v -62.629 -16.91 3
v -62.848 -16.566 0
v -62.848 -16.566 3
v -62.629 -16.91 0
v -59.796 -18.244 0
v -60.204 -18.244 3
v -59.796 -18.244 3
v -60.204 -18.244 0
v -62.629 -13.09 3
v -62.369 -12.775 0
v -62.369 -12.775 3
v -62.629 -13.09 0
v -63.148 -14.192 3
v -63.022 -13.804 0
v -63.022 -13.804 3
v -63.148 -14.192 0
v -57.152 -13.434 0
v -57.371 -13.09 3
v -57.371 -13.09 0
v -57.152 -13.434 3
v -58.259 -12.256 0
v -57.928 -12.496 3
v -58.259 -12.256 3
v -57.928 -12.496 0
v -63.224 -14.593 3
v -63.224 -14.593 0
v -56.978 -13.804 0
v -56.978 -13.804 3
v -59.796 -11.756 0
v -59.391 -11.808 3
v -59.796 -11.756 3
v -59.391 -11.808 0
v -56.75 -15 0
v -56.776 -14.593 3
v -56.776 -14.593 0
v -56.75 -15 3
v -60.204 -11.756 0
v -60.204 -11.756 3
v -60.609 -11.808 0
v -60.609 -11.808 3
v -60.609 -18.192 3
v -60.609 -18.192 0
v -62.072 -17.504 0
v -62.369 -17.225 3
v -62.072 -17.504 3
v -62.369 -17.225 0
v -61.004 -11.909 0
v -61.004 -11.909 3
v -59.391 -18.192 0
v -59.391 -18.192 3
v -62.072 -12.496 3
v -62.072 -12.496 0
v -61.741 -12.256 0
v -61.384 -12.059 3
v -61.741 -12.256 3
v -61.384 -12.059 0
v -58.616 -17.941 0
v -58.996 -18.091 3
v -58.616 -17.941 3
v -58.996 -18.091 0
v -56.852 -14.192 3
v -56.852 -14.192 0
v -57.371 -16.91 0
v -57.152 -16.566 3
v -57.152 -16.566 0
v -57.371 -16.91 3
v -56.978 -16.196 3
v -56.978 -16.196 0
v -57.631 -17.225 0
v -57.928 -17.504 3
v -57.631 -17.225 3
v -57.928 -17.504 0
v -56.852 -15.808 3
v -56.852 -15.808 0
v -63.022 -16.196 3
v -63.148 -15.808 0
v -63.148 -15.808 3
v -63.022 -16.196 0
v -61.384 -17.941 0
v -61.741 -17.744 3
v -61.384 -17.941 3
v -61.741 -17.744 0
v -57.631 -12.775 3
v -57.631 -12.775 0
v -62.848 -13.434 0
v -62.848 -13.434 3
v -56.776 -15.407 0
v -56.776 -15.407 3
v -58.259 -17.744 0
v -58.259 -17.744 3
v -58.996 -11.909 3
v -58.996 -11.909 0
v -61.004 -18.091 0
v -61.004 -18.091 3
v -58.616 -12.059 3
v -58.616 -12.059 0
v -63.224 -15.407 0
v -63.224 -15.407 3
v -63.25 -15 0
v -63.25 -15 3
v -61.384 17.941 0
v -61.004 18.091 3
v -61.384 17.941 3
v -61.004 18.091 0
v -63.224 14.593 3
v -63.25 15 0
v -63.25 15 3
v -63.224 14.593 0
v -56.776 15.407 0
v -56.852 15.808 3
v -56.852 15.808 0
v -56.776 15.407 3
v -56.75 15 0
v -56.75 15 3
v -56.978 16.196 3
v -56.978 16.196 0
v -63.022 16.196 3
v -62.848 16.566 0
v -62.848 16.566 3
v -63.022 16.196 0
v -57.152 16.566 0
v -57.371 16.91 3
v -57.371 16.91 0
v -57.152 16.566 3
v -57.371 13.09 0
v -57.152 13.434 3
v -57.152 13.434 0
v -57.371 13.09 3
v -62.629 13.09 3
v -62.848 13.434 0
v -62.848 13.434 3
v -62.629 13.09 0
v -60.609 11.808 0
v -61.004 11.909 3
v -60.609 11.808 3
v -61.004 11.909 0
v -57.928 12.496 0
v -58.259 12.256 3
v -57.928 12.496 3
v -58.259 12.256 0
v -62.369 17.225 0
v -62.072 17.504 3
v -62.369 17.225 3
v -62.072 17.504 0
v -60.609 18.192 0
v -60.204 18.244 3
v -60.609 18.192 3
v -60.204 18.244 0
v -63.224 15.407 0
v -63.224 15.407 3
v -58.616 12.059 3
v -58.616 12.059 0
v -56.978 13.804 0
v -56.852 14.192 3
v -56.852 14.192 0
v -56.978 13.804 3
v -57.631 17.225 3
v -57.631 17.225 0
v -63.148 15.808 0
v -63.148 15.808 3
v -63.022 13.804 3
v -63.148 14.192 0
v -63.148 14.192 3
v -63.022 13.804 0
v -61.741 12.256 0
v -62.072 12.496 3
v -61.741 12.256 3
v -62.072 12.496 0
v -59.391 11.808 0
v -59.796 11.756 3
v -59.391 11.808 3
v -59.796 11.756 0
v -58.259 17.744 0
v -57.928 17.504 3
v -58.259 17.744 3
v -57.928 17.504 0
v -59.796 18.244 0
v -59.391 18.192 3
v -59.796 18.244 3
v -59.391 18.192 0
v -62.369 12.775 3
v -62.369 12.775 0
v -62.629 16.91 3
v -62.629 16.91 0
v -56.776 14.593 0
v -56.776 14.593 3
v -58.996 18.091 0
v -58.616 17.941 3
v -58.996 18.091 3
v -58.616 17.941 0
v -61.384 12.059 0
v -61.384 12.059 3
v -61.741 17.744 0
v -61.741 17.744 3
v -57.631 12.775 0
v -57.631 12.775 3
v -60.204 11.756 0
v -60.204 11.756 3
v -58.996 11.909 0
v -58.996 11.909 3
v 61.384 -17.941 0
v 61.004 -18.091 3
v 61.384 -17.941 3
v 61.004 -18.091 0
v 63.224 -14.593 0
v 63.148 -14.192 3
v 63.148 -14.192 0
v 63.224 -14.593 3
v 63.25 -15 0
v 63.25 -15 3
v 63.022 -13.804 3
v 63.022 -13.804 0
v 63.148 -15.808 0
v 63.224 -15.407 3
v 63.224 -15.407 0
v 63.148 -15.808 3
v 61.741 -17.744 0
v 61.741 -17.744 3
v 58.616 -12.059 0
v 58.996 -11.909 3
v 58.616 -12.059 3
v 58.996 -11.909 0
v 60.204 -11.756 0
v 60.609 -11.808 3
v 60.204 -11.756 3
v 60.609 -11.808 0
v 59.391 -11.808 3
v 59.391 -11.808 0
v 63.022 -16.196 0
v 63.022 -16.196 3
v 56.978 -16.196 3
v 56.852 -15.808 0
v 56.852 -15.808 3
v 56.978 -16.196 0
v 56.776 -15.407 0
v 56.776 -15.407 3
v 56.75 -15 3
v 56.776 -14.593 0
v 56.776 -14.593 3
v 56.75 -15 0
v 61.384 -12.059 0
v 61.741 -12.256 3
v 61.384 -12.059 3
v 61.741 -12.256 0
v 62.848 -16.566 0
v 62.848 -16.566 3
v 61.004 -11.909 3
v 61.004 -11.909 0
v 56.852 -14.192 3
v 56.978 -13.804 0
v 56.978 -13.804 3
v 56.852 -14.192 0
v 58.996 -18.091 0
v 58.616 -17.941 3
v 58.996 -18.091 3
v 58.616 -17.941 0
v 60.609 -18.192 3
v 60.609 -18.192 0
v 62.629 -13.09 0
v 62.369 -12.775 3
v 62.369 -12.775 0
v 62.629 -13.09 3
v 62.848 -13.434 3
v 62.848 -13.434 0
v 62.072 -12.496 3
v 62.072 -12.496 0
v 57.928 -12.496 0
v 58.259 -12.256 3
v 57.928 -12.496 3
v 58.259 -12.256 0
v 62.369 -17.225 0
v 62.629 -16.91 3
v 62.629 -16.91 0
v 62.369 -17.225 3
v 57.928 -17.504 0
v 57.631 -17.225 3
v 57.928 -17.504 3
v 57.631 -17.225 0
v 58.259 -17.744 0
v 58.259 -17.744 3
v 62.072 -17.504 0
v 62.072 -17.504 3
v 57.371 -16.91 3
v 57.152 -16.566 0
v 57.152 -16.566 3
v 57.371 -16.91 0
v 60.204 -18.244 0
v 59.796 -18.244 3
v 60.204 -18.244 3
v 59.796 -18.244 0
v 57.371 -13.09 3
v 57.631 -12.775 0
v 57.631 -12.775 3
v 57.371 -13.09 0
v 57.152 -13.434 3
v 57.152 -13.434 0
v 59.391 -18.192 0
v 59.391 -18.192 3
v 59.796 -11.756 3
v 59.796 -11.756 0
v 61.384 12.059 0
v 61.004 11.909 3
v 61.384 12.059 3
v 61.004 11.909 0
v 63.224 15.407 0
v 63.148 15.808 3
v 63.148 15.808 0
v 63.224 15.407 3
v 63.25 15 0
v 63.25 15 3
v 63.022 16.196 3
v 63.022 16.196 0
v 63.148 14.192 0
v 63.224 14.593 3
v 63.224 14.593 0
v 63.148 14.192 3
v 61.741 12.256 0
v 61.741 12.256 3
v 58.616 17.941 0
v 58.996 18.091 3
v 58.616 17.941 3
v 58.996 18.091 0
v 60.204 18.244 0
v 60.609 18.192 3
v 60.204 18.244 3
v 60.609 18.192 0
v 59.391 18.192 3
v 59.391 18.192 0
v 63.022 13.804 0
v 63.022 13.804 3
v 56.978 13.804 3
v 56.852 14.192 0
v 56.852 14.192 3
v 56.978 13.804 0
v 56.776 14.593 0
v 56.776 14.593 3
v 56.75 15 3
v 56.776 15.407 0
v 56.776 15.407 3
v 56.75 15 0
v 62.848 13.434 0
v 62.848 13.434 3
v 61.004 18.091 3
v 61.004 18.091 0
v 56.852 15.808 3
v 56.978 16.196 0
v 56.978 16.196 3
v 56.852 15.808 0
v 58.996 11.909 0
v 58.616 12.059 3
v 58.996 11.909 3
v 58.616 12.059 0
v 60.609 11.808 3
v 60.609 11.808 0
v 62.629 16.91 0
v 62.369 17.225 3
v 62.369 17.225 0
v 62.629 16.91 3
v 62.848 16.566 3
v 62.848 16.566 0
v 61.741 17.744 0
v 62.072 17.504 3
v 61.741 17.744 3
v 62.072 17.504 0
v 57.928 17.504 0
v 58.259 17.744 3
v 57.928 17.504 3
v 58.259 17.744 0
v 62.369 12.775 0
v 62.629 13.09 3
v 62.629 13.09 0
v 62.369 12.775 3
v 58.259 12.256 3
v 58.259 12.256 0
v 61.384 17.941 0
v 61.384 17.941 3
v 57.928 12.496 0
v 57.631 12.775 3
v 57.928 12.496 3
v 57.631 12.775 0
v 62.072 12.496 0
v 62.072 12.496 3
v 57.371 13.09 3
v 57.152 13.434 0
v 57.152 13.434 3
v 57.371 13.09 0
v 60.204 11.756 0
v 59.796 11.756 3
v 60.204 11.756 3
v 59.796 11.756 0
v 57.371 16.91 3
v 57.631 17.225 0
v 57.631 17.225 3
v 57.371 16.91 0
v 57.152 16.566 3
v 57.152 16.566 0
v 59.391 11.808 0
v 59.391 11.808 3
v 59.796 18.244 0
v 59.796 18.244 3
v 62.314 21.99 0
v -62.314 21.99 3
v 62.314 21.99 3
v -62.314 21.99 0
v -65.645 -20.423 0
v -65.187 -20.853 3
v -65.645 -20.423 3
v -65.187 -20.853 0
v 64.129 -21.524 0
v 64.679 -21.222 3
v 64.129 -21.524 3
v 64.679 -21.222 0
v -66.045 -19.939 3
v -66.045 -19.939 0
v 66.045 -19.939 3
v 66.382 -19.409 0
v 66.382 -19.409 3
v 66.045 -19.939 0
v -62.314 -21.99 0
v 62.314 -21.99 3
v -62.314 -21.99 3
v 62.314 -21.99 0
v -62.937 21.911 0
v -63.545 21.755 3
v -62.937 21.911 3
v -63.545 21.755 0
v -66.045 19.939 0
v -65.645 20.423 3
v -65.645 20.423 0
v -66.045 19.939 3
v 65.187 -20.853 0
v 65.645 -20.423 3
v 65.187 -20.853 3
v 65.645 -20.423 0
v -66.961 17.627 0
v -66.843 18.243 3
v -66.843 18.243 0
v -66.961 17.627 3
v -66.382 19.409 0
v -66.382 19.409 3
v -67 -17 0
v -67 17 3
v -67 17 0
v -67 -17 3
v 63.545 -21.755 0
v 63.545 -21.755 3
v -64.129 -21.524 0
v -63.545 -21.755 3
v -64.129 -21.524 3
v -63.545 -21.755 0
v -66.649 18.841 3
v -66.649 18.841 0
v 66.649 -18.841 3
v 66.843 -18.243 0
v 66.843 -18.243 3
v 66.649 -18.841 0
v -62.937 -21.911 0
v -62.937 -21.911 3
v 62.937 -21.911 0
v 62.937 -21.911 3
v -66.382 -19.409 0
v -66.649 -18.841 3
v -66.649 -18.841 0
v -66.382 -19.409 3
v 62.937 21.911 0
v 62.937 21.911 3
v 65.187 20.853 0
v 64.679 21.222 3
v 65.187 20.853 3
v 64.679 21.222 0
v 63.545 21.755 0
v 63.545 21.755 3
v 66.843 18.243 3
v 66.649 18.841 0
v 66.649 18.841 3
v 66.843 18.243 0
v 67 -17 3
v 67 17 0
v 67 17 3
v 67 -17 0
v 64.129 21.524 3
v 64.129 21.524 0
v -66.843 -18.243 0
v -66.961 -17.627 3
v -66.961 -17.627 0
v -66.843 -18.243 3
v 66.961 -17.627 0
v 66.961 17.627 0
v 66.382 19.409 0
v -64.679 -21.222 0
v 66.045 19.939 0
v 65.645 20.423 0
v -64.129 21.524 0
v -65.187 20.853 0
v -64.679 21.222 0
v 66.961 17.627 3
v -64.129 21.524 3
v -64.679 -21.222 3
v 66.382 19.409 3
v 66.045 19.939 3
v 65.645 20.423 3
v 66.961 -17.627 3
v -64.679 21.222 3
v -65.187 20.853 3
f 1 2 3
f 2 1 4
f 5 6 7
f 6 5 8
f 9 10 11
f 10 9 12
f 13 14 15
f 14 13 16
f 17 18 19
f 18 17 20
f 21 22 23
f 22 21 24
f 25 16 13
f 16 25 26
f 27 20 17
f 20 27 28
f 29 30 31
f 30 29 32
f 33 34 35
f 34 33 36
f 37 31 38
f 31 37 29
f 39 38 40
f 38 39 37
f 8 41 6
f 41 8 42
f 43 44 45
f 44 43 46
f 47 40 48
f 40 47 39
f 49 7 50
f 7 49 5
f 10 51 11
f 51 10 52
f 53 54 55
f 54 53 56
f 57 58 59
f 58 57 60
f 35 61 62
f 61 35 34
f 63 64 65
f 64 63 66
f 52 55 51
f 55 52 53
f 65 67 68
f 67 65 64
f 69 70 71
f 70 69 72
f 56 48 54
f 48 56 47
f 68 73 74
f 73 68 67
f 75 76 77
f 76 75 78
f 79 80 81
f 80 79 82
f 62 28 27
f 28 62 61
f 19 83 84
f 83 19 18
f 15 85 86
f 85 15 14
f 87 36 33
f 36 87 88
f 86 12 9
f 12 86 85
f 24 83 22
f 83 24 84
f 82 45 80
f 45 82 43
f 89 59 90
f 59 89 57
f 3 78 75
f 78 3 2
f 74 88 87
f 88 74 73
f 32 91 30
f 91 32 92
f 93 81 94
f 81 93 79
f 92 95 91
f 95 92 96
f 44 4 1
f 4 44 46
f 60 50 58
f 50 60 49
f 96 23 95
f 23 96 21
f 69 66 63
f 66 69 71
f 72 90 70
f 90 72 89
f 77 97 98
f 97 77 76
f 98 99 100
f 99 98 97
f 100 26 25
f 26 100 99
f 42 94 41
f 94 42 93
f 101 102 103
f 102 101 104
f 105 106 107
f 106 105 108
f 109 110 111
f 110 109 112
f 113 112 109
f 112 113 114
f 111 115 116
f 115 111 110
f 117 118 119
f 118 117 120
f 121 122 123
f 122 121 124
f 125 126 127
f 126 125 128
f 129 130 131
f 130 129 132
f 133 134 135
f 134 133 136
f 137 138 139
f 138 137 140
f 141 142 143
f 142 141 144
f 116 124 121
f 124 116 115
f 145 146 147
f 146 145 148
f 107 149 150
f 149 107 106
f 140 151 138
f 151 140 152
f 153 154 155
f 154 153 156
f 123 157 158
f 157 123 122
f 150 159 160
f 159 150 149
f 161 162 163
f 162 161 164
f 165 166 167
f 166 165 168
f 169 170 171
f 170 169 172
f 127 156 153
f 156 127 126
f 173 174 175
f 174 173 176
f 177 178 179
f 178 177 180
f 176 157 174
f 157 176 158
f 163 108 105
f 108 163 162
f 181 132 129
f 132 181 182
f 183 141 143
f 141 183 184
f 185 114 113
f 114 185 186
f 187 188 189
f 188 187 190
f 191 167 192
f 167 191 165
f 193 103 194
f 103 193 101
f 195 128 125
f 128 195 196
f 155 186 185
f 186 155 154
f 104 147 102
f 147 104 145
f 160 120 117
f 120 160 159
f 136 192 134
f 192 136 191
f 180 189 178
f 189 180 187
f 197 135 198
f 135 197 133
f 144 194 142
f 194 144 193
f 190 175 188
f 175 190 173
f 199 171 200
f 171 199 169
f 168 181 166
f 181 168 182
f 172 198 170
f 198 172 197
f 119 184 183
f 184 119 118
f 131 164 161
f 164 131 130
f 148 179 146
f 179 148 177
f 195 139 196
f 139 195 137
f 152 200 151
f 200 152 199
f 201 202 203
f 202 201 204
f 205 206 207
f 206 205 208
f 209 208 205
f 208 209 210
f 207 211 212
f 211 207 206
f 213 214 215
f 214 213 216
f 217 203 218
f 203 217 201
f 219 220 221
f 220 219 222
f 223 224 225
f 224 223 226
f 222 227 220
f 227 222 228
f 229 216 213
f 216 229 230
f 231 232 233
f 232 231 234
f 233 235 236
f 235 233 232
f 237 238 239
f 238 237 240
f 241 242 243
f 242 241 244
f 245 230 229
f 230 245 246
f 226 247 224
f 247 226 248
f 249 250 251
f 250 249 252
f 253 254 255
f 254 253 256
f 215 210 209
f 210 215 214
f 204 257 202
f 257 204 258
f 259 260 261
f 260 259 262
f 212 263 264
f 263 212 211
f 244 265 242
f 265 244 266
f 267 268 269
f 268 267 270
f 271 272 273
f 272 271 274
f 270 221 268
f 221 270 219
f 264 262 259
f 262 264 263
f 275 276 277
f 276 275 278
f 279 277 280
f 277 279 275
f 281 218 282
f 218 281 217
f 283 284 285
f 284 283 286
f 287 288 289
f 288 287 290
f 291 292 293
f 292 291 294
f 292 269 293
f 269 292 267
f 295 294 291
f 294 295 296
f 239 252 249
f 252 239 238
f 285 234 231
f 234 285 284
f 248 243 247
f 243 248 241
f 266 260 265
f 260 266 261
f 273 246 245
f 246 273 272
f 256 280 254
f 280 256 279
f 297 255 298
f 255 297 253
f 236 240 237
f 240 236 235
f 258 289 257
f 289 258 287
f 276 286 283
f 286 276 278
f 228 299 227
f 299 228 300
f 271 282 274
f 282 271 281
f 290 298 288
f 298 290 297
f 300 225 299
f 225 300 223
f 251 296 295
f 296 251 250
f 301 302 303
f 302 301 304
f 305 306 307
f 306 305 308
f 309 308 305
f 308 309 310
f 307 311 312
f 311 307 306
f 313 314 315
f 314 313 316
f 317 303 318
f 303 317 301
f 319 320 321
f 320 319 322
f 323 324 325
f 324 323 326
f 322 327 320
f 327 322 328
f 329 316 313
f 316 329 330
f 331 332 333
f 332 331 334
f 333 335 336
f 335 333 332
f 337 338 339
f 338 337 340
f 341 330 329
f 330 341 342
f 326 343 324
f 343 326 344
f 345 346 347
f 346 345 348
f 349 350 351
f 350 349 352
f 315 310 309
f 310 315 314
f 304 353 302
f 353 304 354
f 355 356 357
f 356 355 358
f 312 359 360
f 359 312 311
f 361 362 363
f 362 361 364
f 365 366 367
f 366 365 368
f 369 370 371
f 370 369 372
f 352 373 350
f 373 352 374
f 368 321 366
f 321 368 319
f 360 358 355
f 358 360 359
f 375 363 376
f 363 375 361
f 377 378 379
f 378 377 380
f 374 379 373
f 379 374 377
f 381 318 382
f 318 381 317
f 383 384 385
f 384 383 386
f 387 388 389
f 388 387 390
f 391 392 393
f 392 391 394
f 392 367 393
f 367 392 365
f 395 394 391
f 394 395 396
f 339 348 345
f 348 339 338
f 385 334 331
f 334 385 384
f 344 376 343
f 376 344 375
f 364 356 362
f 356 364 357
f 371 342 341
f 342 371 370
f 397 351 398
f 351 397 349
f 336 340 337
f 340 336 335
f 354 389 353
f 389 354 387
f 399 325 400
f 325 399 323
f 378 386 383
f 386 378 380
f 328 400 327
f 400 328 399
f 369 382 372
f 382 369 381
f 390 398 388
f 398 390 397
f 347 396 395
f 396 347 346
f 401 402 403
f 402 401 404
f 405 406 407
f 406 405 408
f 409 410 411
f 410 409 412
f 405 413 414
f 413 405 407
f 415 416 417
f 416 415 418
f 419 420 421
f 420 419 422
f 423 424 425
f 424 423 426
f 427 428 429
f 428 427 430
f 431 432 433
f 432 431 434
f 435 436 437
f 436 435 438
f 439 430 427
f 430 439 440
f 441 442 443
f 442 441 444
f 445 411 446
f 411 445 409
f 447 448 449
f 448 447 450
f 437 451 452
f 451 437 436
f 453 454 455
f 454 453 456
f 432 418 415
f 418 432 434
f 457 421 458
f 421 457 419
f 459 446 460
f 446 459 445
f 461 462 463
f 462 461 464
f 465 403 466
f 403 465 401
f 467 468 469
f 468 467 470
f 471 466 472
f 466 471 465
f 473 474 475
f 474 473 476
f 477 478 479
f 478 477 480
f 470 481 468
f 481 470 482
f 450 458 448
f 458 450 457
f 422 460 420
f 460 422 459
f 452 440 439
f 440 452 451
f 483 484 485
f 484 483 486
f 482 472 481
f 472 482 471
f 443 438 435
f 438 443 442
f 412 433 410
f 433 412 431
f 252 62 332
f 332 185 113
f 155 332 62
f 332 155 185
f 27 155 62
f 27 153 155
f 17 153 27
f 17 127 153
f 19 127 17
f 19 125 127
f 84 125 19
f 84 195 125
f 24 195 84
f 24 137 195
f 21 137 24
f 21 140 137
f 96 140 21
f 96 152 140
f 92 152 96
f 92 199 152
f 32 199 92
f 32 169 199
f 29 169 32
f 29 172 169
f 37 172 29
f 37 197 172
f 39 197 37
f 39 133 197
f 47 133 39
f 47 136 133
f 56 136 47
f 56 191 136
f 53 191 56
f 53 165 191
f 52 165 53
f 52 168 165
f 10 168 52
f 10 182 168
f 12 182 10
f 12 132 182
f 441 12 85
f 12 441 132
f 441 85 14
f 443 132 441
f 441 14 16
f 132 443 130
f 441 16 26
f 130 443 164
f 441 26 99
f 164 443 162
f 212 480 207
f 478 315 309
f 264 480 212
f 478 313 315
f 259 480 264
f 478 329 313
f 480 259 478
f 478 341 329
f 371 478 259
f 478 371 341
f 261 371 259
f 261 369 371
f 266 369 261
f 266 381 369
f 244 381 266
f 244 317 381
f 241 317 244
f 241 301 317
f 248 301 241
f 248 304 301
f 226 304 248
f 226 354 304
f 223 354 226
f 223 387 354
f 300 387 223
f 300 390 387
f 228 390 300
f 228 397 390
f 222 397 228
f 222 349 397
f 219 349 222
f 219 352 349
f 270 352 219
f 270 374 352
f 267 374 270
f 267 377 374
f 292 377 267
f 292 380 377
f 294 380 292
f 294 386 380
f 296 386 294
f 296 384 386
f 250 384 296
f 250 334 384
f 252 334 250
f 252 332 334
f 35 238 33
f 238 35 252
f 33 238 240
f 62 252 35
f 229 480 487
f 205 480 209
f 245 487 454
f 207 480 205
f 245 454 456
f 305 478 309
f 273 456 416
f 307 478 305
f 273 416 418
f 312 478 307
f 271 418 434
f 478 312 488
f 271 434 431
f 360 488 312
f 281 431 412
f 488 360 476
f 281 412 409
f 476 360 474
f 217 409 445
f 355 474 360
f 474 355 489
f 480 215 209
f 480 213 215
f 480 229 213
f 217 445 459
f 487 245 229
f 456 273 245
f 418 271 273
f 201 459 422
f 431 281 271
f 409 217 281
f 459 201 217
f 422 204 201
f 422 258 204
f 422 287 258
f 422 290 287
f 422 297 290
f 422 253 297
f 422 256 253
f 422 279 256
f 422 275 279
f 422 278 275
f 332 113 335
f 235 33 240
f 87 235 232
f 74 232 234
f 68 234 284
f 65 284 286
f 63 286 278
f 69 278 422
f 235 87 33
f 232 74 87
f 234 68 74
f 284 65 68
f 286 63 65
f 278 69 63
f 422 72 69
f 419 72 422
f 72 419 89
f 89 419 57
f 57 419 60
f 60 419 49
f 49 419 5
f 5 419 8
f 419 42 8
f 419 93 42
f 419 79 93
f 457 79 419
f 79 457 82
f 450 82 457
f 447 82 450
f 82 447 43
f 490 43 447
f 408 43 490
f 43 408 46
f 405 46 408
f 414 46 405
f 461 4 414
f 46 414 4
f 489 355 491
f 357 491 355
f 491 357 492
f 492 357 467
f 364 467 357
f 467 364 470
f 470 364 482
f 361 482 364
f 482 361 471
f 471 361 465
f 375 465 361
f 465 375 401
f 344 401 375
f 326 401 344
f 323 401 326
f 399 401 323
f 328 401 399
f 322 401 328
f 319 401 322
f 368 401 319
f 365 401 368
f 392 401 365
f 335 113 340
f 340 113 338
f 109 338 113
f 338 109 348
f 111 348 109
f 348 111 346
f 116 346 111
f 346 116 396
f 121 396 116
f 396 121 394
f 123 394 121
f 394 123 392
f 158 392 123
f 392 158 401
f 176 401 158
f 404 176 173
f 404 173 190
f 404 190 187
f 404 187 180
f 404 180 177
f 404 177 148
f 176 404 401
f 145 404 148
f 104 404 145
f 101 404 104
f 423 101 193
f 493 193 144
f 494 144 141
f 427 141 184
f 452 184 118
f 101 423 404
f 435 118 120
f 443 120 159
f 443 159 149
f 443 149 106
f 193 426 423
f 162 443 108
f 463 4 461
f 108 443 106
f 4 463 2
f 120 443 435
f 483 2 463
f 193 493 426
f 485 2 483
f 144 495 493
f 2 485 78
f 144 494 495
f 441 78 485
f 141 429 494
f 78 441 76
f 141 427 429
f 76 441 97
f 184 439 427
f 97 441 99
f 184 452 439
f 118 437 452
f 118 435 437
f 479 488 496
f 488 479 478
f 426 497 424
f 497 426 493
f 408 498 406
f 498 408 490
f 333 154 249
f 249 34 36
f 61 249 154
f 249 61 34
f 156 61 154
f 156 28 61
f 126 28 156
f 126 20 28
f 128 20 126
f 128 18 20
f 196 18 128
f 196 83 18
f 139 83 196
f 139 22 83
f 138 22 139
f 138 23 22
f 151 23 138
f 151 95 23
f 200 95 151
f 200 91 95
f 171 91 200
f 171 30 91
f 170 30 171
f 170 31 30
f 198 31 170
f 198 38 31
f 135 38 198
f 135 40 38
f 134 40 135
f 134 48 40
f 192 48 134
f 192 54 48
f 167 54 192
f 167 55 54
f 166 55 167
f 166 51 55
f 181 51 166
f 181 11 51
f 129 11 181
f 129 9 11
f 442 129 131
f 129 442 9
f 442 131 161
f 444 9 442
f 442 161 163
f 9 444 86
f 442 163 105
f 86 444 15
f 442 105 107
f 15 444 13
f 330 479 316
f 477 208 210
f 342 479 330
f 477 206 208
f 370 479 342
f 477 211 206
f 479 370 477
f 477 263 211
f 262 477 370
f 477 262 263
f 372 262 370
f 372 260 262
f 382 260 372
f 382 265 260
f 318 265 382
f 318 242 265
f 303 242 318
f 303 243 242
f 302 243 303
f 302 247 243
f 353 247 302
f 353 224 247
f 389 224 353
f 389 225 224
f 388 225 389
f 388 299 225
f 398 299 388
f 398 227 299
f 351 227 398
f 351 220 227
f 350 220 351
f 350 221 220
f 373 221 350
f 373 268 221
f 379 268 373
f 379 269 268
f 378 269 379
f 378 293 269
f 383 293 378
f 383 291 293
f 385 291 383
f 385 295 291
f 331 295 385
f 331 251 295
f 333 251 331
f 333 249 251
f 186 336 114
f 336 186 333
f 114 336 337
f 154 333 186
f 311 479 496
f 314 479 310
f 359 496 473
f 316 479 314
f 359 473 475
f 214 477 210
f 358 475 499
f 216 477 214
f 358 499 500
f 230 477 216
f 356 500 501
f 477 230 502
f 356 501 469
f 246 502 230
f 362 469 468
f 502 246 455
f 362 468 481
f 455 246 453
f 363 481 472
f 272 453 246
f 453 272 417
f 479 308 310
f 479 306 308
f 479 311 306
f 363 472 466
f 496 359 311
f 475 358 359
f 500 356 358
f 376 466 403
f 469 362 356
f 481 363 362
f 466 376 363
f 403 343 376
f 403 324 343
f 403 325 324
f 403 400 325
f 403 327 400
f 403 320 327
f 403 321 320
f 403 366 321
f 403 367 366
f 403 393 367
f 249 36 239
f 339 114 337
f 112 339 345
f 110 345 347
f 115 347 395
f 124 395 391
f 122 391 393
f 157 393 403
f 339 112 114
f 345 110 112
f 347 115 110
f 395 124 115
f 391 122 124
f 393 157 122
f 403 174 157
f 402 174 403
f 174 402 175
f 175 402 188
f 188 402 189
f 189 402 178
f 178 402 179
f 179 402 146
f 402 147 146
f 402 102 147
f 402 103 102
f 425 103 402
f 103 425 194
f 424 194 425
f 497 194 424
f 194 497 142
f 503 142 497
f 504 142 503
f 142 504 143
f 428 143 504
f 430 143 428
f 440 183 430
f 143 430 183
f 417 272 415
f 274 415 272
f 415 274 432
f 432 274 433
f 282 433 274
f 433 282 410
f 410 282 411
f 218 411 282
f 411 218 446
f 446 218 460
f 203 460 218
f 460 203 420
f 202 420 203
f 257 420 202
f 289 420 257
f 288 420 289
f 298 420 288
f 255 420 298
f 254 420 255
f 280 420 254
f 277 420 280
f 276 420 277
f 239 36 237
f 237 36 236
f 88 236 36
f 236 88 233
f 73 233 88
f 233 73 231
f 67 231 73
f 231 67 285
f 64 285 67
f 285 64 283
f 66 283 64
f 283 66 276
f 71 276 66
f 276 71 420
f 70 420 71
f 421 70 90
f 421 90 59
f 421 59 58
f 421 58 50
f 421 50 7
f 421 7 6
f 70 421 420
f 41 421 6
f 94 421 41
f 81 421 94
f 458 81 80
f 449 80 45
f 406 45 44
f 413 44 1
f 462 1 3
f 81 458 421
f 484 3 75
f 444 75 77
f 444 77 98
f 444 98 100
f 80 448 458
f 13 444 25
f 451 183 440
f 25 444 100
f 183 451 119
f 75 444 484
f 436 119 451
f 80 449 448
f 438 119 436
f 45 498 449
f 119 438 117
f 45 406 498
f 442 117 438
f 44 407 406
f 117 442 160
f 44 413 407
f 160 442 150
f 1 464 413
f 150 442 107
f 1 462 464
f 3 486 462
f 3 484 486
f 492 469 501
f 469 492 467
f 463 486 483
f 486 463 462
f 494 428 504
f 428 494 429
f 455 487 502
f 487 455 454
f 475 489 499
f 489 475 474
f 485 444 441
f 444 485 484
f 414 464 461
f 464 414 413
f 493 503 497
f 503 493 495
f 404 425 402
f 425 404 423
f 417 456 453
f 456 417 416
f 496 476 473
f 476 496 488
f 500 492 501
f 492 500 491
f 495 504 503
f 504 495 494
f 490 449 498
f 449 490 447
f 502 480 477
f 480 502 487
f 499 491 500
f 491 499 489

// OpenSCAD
$fn = 50;


difference() {
	union() {
		hull() {
			translate(v = [-62.0000000000, 17.0000000000, 0]) {
				cylinder(h = 3, r = 5);
			}
			translate(v = [62.0000000000, 17.0000000000, 0]) {
				cylinder(h = 3, r = 5);
			}
			translate(v = [-62.0000000000, -17.0000000000, 0]) {
				cylinder(h = 3, r = 5);
			}
			translate(v = [62.0000000000, -17.0000000000, 0]) {
				cylinder(h = 3, r = 5);
			}
		}
	}
	union() {
		translate(v = [-60.0000000000, -15.0000000000, -100.0000000000]) {
			cylinder(h = 200, r = 3.2500000000);
		}
		translate(v = [-60.0000000000, 15.0000000000, -100.0000000000]) {
			cylinder(h = 200, r = 3.2500000000);
		}
		translate(v = [60.0000000000, -15.0000000000, -100.0000000000]) {
			cylinder(h = 200, r = 3.2500000000);
		}
		translate(v = [60.0000000000, 15.0000000000, -100.0000000000]) {
			cylinder(h = 200, r = 3.2500000000);
		}
	}
}
